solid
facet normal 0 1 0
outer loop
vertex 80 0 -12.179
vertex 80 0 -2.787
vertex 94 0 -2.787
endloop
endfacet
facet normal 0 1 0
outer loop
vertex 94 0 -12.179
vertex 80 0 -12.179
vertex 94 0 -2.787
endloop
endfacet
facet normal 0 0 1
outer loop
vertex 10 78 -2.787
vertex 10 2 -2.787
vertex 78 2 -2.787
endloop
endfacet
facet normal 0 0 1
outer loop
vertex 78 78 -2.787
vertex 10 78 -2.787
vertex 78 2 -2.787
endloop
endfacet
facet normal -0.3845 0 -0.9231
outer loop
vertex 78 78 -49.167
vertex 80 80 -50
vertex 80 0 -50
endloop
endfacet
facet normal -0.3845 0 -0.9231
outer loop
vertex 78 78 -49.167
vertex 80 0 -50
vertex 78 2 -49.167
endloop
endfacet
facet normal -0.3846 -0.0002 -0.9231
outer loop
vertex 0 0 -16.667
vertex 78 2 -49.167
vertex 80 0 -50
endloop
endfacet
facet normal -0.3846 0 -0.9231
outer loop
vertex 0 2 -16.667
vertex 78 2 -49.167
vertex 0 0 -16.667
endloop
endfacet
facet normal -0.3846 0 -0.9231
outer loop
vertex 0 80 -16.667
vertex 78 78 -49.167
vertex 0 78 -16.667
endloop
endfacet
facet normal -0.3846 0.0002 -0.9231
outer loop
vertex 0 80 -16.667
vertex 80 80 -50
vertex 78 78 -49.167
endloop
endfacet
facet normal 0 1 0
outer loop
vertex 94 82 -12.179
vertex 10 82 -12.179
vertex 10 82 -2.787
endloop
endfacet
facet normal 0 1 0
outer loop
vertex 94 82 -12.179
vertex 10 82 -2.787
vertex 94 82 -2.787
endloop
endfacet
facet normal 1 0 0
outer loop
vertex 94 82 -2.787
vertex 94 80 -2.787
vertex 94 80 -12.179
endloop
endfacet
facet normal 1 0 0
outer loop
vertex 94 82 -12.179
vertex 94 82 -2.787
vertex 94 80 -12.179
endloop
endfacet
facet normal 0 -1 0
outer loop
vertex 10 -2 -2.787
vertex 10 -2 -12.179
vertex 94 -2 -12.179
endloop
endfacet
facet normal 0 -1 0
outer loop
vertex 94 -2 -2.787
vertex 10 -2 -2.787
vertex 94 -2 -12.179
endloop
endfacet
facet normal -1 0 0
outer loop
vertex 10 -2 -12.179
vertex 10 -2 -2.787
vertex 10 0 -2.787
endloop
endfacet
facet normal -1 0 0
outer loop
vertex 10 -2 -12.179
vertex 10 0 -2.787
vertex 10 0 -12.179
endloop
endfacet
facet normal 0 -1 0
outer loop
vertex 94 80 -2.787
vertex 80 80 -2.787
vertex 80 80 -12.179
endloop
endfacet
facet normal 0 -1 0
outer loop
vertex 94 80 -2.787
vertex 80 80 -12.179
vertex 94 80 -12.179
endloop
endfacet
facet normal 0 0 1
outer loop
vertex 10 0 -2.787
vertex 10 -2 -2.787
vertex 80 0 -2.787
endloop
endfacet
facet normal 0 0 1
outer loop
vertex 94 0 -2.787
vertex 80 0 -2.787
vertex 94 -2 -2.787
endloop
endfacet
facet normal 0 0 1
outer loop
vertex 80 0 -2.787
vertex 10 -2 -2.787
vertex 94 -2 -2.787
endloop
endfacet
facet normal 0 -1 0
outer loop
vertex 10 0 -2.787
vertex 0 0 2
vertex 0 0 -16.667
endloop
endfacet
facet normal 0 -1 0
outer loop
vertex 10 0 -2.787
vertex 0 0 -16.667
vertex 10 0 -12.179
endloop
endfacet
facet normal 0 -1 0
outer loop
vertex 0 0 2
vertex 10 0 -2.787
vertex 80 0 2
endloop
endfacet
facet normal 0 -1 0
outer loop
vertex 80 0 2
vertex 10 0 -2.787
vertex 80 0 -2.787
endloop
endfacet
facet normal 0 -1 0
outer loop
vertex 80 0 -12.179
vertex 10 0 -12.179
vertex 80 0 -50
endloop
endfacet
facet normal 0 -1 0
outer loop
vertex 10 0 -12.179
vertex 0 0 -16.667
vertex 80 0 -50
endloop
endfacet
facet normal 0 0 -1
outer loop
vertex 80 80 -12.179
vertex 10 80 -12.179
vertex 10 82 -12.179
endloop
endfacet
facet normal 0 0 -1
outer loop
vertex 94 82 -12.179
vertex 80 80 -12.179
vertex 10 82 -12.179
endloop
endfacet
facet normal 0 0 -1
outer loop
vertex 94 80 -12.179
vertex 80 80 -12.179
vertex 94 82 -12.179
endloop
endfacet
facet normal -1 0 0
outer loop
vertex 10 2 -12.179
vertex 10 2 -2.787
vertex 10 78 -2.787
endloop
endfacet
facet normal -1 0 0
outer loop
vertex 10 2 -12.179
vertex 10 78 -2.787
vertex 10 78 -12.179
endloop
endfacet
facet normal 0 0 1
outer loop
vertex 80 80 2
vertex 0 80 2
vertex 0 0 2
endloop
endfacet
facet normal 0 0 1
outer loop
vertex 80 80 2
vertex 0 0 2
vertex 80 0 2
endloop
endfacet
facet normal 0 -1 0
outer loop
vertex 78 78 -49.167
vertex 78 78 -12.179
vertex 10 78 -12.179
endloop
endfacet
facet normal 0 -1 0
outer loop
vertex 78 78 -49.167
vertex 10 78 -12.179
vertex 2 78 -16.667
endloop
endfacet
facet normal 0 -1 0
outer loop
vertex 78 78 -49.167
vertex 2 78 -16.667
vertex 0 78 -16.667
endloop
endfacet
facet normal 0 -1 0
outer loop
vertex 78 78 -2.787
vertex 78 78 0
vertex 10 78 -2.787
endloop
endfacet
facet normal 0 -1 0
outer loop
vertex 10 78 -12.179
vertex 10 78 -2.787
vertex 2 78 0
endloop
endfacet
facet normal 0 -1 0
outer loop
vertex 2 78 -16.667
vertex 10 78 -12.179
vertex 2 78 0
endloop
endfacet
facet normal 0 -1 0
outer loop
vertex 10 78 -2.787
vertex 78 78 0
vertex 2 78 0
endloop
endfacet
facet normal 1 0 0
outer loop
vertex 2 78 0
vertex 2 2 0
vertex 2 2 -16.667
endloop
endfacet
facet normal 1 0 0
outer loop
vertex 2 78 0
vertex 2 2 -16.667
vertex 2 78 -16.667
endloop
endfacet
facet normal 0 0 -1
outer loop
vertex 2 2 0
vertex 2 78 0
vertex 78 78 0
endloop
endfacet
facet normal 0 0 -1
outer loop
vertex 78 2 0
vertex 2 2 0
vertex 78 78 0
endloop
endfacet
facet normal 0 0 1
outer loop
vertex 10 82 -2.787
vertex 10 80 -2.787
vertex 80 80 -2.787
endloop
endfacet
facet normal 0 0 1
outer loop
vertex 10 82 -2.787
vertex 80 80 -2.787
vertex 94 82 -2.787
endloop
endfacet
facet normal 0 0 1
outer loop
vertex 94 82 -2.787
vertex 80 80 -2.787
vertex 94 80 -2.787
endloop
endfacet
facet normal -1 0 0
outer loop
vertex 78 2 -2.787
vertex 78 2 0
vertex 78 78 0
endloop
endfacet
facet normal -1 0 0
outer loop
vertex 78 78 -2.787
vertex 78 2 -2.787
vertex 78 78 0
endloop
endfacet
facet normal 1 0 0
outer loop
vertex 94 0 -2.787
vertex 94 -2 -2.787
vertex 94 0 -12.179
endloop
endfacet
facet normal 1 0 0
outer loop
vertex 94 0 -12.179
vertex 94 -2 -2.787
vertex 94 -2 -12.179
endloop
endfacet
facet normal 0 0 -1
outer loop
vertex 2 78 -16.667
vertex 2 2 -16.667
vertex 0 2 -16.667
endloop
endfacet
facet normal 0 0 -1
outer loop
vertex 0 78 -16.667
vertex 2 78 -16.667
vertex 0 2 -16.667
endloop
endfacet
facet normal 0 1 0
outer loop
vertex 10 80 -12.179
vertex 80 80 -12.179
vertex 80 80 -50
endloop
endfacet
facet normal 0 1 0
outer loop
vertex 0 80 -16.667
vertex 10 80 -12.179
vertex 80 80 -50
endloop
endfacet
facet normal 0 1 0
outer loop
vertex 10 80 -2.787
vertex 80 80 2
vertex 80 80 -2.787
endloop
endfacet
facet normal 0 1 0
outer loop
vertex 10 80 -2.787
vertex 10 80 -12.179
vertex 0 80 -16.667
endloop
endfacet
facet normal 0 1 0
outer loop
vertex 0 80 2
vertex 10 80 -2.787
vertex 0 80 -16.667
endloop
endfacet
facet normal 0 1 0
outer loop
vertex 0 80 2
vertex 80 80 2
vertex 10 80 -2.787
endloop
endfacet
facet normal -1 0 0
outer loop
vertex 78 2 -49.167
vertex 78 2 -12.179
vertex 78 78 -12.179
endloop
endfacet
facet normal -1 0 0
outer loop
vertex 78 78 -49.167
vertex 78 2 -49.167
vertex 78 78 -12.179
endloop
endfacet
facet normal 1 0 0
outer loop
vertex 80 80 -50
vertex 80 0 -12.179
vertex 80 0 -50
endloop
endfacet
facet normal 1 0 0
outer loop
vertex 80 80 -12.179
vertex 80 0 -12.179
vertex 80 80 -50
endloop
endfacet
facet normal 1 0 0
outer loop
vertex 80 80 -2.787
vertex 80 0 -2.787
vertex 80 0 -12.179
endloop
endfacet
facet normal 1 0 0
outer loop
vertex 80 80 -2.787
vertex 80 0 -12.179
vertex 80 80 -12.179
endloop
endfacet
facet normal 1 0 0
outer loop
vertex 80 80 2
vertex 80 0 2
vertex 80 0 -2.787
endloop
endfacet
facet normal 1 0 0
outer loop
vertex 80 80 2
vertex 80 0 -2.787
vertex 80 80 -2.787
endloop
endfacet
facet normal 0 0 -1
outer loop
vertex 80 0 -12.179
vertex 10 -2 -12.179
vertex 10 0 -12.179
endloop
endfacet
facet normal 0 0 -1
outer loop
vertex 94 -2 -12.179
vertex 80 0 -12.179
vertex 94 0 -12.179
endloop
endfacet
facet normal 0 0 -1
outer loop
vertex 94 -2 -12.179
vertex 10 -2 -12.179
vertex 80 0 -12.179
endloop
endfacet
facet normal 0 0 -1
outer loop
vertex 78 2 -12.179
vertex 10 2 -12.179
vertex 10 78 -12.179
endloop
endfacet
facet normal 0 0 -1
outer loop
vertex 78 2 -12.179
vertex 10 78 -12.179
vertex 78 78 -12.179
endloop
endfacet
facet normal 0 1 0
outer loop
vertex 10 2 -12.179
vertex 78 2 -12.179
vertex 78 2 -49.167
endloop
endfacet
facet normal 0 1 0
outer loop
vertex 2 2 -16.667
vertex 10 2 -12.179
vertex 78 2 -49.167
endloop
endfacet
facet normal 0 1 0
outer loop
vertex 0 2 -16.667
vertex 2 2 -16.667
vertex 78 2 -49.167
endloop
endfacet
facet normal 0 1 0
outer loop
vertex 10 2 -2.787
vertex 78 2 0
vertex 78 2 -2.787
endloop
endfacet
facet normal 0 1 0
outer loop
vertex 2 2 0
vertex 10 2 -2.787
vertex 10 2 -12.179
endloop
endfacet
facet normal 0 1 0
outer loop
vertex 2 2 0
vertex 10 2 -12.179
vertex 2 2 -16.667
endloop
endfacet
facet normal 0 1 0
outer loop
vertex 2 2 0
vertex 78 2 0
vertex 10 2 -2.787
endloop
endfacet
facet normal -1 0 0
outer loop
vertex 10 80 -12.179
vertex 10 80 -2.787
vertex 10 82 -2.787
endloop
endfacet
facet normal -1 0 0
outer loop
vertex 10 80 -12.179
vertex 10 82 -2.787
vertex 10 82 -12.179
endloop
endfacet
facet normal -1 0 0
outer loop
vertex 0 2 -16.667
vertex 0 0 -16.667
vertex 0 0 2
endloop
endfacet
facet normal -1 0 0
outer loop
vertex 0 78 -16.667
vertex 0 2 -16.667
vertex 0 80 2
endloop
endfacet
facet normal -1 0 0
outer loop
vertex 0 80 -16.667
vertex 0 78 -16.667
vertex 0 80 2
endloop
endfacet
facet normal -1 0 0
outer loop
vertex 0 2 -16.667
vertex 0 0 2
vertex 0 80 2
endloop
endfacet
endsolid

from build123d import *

# Parameters (mm, degrees)
SKETCH1_W                = 80
SKETCH1_H                = 80
BOSS_EXTRUDE1_DEPTH      = 2
SKETCH2_W                = 80
SKETCH2_H                = 2
BOSS_EXTRUDE2_DEPTH      = 50
SKETCH3_W                = 2
SKETCH3_H                = 76
BOSS_EXTRUDE3_DEPTH      = 50
CUT_EXTRUDE2_DEPTH       = 100
SKETCH6_W                = 2
SKETCH6_H                = 76
BOSS_EXTRUDE4_DEPTH      = 16.666666667
BOSS_EXTRUDE5_DEPTH      = 2
BOSS_EXTRUDE5_DEPTH_BACK = 82
SKETCH7_W                = 84
SKETCH7_H                = 9.392000317
SKETCH8_W                = 14
SKETCH8_H                = 80
CUT_EXTRUDE3_DEPTH       = 50


with BuildPart() as part:
    # Sketch1 → Boss-Extrude1 (new body)
    with BuildSketch(Plane.XY):
        with Locations((40, 40)):
            Rectangle(SKETCH1_W, SKETCH1_H)
    extrude(amount=BOSS_EXTRUDE1_DEPTH)

    # Sketch2 → Boss-Extrude2 (add)
    with BuildSketch(Plane(origin=(0, 0, 0), x_dir=(-1, 0, 0), z_dir=(0, 0, -1))):
        with Locations((-40, 79)):
            Rectangle(SKETCH2_W, SKETCH2_H)
        with Locations((-40, 1)):
            Rectangle(SKETCH2_W, SKETCH2_H)
    extrude(amount=BOSS_EXTRUDE2_DEPTH)

    # Sketch3 → Boss-Extrude3 (add)
    with BuildSketch(Plane(origin=(0, 0, 0), x_dir=(-1, 0, 0), z_dir=(0, 0, -1))):
        with Locations((-79, 40)):
            Rectangle(SKETCH3_W, SKETCH3_H)
    extrude(amount=BOSS_EXTRUDE3_DEPTH)

    # Sketch5 → Cut-Extrude2 (cut)
    with BuildSketch(Plane(origin=(0, 80, 0), x_dir=(1, 0, 0), z_dir=(0, 1, 0))):
        Polygon((80, 50), (0, 16.666666667), (0, 50), align=None)
    extrude(amount=-CUT_EXTRUDE2_DEPTH, mode=Mode.SUBTRACT)

    # Sketch6 → Boss-Extrude4 (add)
    with BuildSketch(Plane(origin=(0, 0, 0), x_dir=(-1, 0, 0), z_dir=(0, 0, -1))):
        with Locations((-1, 40)):
            Rectangle(SKETCH6_W, SKETCH6_H)
    extrude(amount=BOSS_EXTRUDE4_DEPTH)

    # Sketch7 → Boss-Extrude5 (add, two sides: drawn at the far end of the back side and taken through both)
    with BuildSketch(Plane(origin=(0, 80, 0), x_dir=(1, 0, 0), z_dir=(0, 1, 0)).offset(-BOSS_EXTRUDE5_DEPTH_BACK)):
        with Locations((52, 7.482577596)):
            Rectangle(SKETCH7_W, SKETCH7_H)
    extrude(amount=BOSS_EXTRUDE5_DEPTH + BOSS_EXTRUDE5_DEPTH_BACK)

    # Sketch8 → Cut-Extrude3 (cut)
    with BuildSketch(Plane.XY.offset(-2.786577437)):
        with Locations((87, 40)):
            Rectangle(SKETCH8_W, SKETCH8_H)
    extrude(amount=-CUT_EXTRUDE3_DEPTH, mode=Mode.SUBTRACT)


solid = part.part
